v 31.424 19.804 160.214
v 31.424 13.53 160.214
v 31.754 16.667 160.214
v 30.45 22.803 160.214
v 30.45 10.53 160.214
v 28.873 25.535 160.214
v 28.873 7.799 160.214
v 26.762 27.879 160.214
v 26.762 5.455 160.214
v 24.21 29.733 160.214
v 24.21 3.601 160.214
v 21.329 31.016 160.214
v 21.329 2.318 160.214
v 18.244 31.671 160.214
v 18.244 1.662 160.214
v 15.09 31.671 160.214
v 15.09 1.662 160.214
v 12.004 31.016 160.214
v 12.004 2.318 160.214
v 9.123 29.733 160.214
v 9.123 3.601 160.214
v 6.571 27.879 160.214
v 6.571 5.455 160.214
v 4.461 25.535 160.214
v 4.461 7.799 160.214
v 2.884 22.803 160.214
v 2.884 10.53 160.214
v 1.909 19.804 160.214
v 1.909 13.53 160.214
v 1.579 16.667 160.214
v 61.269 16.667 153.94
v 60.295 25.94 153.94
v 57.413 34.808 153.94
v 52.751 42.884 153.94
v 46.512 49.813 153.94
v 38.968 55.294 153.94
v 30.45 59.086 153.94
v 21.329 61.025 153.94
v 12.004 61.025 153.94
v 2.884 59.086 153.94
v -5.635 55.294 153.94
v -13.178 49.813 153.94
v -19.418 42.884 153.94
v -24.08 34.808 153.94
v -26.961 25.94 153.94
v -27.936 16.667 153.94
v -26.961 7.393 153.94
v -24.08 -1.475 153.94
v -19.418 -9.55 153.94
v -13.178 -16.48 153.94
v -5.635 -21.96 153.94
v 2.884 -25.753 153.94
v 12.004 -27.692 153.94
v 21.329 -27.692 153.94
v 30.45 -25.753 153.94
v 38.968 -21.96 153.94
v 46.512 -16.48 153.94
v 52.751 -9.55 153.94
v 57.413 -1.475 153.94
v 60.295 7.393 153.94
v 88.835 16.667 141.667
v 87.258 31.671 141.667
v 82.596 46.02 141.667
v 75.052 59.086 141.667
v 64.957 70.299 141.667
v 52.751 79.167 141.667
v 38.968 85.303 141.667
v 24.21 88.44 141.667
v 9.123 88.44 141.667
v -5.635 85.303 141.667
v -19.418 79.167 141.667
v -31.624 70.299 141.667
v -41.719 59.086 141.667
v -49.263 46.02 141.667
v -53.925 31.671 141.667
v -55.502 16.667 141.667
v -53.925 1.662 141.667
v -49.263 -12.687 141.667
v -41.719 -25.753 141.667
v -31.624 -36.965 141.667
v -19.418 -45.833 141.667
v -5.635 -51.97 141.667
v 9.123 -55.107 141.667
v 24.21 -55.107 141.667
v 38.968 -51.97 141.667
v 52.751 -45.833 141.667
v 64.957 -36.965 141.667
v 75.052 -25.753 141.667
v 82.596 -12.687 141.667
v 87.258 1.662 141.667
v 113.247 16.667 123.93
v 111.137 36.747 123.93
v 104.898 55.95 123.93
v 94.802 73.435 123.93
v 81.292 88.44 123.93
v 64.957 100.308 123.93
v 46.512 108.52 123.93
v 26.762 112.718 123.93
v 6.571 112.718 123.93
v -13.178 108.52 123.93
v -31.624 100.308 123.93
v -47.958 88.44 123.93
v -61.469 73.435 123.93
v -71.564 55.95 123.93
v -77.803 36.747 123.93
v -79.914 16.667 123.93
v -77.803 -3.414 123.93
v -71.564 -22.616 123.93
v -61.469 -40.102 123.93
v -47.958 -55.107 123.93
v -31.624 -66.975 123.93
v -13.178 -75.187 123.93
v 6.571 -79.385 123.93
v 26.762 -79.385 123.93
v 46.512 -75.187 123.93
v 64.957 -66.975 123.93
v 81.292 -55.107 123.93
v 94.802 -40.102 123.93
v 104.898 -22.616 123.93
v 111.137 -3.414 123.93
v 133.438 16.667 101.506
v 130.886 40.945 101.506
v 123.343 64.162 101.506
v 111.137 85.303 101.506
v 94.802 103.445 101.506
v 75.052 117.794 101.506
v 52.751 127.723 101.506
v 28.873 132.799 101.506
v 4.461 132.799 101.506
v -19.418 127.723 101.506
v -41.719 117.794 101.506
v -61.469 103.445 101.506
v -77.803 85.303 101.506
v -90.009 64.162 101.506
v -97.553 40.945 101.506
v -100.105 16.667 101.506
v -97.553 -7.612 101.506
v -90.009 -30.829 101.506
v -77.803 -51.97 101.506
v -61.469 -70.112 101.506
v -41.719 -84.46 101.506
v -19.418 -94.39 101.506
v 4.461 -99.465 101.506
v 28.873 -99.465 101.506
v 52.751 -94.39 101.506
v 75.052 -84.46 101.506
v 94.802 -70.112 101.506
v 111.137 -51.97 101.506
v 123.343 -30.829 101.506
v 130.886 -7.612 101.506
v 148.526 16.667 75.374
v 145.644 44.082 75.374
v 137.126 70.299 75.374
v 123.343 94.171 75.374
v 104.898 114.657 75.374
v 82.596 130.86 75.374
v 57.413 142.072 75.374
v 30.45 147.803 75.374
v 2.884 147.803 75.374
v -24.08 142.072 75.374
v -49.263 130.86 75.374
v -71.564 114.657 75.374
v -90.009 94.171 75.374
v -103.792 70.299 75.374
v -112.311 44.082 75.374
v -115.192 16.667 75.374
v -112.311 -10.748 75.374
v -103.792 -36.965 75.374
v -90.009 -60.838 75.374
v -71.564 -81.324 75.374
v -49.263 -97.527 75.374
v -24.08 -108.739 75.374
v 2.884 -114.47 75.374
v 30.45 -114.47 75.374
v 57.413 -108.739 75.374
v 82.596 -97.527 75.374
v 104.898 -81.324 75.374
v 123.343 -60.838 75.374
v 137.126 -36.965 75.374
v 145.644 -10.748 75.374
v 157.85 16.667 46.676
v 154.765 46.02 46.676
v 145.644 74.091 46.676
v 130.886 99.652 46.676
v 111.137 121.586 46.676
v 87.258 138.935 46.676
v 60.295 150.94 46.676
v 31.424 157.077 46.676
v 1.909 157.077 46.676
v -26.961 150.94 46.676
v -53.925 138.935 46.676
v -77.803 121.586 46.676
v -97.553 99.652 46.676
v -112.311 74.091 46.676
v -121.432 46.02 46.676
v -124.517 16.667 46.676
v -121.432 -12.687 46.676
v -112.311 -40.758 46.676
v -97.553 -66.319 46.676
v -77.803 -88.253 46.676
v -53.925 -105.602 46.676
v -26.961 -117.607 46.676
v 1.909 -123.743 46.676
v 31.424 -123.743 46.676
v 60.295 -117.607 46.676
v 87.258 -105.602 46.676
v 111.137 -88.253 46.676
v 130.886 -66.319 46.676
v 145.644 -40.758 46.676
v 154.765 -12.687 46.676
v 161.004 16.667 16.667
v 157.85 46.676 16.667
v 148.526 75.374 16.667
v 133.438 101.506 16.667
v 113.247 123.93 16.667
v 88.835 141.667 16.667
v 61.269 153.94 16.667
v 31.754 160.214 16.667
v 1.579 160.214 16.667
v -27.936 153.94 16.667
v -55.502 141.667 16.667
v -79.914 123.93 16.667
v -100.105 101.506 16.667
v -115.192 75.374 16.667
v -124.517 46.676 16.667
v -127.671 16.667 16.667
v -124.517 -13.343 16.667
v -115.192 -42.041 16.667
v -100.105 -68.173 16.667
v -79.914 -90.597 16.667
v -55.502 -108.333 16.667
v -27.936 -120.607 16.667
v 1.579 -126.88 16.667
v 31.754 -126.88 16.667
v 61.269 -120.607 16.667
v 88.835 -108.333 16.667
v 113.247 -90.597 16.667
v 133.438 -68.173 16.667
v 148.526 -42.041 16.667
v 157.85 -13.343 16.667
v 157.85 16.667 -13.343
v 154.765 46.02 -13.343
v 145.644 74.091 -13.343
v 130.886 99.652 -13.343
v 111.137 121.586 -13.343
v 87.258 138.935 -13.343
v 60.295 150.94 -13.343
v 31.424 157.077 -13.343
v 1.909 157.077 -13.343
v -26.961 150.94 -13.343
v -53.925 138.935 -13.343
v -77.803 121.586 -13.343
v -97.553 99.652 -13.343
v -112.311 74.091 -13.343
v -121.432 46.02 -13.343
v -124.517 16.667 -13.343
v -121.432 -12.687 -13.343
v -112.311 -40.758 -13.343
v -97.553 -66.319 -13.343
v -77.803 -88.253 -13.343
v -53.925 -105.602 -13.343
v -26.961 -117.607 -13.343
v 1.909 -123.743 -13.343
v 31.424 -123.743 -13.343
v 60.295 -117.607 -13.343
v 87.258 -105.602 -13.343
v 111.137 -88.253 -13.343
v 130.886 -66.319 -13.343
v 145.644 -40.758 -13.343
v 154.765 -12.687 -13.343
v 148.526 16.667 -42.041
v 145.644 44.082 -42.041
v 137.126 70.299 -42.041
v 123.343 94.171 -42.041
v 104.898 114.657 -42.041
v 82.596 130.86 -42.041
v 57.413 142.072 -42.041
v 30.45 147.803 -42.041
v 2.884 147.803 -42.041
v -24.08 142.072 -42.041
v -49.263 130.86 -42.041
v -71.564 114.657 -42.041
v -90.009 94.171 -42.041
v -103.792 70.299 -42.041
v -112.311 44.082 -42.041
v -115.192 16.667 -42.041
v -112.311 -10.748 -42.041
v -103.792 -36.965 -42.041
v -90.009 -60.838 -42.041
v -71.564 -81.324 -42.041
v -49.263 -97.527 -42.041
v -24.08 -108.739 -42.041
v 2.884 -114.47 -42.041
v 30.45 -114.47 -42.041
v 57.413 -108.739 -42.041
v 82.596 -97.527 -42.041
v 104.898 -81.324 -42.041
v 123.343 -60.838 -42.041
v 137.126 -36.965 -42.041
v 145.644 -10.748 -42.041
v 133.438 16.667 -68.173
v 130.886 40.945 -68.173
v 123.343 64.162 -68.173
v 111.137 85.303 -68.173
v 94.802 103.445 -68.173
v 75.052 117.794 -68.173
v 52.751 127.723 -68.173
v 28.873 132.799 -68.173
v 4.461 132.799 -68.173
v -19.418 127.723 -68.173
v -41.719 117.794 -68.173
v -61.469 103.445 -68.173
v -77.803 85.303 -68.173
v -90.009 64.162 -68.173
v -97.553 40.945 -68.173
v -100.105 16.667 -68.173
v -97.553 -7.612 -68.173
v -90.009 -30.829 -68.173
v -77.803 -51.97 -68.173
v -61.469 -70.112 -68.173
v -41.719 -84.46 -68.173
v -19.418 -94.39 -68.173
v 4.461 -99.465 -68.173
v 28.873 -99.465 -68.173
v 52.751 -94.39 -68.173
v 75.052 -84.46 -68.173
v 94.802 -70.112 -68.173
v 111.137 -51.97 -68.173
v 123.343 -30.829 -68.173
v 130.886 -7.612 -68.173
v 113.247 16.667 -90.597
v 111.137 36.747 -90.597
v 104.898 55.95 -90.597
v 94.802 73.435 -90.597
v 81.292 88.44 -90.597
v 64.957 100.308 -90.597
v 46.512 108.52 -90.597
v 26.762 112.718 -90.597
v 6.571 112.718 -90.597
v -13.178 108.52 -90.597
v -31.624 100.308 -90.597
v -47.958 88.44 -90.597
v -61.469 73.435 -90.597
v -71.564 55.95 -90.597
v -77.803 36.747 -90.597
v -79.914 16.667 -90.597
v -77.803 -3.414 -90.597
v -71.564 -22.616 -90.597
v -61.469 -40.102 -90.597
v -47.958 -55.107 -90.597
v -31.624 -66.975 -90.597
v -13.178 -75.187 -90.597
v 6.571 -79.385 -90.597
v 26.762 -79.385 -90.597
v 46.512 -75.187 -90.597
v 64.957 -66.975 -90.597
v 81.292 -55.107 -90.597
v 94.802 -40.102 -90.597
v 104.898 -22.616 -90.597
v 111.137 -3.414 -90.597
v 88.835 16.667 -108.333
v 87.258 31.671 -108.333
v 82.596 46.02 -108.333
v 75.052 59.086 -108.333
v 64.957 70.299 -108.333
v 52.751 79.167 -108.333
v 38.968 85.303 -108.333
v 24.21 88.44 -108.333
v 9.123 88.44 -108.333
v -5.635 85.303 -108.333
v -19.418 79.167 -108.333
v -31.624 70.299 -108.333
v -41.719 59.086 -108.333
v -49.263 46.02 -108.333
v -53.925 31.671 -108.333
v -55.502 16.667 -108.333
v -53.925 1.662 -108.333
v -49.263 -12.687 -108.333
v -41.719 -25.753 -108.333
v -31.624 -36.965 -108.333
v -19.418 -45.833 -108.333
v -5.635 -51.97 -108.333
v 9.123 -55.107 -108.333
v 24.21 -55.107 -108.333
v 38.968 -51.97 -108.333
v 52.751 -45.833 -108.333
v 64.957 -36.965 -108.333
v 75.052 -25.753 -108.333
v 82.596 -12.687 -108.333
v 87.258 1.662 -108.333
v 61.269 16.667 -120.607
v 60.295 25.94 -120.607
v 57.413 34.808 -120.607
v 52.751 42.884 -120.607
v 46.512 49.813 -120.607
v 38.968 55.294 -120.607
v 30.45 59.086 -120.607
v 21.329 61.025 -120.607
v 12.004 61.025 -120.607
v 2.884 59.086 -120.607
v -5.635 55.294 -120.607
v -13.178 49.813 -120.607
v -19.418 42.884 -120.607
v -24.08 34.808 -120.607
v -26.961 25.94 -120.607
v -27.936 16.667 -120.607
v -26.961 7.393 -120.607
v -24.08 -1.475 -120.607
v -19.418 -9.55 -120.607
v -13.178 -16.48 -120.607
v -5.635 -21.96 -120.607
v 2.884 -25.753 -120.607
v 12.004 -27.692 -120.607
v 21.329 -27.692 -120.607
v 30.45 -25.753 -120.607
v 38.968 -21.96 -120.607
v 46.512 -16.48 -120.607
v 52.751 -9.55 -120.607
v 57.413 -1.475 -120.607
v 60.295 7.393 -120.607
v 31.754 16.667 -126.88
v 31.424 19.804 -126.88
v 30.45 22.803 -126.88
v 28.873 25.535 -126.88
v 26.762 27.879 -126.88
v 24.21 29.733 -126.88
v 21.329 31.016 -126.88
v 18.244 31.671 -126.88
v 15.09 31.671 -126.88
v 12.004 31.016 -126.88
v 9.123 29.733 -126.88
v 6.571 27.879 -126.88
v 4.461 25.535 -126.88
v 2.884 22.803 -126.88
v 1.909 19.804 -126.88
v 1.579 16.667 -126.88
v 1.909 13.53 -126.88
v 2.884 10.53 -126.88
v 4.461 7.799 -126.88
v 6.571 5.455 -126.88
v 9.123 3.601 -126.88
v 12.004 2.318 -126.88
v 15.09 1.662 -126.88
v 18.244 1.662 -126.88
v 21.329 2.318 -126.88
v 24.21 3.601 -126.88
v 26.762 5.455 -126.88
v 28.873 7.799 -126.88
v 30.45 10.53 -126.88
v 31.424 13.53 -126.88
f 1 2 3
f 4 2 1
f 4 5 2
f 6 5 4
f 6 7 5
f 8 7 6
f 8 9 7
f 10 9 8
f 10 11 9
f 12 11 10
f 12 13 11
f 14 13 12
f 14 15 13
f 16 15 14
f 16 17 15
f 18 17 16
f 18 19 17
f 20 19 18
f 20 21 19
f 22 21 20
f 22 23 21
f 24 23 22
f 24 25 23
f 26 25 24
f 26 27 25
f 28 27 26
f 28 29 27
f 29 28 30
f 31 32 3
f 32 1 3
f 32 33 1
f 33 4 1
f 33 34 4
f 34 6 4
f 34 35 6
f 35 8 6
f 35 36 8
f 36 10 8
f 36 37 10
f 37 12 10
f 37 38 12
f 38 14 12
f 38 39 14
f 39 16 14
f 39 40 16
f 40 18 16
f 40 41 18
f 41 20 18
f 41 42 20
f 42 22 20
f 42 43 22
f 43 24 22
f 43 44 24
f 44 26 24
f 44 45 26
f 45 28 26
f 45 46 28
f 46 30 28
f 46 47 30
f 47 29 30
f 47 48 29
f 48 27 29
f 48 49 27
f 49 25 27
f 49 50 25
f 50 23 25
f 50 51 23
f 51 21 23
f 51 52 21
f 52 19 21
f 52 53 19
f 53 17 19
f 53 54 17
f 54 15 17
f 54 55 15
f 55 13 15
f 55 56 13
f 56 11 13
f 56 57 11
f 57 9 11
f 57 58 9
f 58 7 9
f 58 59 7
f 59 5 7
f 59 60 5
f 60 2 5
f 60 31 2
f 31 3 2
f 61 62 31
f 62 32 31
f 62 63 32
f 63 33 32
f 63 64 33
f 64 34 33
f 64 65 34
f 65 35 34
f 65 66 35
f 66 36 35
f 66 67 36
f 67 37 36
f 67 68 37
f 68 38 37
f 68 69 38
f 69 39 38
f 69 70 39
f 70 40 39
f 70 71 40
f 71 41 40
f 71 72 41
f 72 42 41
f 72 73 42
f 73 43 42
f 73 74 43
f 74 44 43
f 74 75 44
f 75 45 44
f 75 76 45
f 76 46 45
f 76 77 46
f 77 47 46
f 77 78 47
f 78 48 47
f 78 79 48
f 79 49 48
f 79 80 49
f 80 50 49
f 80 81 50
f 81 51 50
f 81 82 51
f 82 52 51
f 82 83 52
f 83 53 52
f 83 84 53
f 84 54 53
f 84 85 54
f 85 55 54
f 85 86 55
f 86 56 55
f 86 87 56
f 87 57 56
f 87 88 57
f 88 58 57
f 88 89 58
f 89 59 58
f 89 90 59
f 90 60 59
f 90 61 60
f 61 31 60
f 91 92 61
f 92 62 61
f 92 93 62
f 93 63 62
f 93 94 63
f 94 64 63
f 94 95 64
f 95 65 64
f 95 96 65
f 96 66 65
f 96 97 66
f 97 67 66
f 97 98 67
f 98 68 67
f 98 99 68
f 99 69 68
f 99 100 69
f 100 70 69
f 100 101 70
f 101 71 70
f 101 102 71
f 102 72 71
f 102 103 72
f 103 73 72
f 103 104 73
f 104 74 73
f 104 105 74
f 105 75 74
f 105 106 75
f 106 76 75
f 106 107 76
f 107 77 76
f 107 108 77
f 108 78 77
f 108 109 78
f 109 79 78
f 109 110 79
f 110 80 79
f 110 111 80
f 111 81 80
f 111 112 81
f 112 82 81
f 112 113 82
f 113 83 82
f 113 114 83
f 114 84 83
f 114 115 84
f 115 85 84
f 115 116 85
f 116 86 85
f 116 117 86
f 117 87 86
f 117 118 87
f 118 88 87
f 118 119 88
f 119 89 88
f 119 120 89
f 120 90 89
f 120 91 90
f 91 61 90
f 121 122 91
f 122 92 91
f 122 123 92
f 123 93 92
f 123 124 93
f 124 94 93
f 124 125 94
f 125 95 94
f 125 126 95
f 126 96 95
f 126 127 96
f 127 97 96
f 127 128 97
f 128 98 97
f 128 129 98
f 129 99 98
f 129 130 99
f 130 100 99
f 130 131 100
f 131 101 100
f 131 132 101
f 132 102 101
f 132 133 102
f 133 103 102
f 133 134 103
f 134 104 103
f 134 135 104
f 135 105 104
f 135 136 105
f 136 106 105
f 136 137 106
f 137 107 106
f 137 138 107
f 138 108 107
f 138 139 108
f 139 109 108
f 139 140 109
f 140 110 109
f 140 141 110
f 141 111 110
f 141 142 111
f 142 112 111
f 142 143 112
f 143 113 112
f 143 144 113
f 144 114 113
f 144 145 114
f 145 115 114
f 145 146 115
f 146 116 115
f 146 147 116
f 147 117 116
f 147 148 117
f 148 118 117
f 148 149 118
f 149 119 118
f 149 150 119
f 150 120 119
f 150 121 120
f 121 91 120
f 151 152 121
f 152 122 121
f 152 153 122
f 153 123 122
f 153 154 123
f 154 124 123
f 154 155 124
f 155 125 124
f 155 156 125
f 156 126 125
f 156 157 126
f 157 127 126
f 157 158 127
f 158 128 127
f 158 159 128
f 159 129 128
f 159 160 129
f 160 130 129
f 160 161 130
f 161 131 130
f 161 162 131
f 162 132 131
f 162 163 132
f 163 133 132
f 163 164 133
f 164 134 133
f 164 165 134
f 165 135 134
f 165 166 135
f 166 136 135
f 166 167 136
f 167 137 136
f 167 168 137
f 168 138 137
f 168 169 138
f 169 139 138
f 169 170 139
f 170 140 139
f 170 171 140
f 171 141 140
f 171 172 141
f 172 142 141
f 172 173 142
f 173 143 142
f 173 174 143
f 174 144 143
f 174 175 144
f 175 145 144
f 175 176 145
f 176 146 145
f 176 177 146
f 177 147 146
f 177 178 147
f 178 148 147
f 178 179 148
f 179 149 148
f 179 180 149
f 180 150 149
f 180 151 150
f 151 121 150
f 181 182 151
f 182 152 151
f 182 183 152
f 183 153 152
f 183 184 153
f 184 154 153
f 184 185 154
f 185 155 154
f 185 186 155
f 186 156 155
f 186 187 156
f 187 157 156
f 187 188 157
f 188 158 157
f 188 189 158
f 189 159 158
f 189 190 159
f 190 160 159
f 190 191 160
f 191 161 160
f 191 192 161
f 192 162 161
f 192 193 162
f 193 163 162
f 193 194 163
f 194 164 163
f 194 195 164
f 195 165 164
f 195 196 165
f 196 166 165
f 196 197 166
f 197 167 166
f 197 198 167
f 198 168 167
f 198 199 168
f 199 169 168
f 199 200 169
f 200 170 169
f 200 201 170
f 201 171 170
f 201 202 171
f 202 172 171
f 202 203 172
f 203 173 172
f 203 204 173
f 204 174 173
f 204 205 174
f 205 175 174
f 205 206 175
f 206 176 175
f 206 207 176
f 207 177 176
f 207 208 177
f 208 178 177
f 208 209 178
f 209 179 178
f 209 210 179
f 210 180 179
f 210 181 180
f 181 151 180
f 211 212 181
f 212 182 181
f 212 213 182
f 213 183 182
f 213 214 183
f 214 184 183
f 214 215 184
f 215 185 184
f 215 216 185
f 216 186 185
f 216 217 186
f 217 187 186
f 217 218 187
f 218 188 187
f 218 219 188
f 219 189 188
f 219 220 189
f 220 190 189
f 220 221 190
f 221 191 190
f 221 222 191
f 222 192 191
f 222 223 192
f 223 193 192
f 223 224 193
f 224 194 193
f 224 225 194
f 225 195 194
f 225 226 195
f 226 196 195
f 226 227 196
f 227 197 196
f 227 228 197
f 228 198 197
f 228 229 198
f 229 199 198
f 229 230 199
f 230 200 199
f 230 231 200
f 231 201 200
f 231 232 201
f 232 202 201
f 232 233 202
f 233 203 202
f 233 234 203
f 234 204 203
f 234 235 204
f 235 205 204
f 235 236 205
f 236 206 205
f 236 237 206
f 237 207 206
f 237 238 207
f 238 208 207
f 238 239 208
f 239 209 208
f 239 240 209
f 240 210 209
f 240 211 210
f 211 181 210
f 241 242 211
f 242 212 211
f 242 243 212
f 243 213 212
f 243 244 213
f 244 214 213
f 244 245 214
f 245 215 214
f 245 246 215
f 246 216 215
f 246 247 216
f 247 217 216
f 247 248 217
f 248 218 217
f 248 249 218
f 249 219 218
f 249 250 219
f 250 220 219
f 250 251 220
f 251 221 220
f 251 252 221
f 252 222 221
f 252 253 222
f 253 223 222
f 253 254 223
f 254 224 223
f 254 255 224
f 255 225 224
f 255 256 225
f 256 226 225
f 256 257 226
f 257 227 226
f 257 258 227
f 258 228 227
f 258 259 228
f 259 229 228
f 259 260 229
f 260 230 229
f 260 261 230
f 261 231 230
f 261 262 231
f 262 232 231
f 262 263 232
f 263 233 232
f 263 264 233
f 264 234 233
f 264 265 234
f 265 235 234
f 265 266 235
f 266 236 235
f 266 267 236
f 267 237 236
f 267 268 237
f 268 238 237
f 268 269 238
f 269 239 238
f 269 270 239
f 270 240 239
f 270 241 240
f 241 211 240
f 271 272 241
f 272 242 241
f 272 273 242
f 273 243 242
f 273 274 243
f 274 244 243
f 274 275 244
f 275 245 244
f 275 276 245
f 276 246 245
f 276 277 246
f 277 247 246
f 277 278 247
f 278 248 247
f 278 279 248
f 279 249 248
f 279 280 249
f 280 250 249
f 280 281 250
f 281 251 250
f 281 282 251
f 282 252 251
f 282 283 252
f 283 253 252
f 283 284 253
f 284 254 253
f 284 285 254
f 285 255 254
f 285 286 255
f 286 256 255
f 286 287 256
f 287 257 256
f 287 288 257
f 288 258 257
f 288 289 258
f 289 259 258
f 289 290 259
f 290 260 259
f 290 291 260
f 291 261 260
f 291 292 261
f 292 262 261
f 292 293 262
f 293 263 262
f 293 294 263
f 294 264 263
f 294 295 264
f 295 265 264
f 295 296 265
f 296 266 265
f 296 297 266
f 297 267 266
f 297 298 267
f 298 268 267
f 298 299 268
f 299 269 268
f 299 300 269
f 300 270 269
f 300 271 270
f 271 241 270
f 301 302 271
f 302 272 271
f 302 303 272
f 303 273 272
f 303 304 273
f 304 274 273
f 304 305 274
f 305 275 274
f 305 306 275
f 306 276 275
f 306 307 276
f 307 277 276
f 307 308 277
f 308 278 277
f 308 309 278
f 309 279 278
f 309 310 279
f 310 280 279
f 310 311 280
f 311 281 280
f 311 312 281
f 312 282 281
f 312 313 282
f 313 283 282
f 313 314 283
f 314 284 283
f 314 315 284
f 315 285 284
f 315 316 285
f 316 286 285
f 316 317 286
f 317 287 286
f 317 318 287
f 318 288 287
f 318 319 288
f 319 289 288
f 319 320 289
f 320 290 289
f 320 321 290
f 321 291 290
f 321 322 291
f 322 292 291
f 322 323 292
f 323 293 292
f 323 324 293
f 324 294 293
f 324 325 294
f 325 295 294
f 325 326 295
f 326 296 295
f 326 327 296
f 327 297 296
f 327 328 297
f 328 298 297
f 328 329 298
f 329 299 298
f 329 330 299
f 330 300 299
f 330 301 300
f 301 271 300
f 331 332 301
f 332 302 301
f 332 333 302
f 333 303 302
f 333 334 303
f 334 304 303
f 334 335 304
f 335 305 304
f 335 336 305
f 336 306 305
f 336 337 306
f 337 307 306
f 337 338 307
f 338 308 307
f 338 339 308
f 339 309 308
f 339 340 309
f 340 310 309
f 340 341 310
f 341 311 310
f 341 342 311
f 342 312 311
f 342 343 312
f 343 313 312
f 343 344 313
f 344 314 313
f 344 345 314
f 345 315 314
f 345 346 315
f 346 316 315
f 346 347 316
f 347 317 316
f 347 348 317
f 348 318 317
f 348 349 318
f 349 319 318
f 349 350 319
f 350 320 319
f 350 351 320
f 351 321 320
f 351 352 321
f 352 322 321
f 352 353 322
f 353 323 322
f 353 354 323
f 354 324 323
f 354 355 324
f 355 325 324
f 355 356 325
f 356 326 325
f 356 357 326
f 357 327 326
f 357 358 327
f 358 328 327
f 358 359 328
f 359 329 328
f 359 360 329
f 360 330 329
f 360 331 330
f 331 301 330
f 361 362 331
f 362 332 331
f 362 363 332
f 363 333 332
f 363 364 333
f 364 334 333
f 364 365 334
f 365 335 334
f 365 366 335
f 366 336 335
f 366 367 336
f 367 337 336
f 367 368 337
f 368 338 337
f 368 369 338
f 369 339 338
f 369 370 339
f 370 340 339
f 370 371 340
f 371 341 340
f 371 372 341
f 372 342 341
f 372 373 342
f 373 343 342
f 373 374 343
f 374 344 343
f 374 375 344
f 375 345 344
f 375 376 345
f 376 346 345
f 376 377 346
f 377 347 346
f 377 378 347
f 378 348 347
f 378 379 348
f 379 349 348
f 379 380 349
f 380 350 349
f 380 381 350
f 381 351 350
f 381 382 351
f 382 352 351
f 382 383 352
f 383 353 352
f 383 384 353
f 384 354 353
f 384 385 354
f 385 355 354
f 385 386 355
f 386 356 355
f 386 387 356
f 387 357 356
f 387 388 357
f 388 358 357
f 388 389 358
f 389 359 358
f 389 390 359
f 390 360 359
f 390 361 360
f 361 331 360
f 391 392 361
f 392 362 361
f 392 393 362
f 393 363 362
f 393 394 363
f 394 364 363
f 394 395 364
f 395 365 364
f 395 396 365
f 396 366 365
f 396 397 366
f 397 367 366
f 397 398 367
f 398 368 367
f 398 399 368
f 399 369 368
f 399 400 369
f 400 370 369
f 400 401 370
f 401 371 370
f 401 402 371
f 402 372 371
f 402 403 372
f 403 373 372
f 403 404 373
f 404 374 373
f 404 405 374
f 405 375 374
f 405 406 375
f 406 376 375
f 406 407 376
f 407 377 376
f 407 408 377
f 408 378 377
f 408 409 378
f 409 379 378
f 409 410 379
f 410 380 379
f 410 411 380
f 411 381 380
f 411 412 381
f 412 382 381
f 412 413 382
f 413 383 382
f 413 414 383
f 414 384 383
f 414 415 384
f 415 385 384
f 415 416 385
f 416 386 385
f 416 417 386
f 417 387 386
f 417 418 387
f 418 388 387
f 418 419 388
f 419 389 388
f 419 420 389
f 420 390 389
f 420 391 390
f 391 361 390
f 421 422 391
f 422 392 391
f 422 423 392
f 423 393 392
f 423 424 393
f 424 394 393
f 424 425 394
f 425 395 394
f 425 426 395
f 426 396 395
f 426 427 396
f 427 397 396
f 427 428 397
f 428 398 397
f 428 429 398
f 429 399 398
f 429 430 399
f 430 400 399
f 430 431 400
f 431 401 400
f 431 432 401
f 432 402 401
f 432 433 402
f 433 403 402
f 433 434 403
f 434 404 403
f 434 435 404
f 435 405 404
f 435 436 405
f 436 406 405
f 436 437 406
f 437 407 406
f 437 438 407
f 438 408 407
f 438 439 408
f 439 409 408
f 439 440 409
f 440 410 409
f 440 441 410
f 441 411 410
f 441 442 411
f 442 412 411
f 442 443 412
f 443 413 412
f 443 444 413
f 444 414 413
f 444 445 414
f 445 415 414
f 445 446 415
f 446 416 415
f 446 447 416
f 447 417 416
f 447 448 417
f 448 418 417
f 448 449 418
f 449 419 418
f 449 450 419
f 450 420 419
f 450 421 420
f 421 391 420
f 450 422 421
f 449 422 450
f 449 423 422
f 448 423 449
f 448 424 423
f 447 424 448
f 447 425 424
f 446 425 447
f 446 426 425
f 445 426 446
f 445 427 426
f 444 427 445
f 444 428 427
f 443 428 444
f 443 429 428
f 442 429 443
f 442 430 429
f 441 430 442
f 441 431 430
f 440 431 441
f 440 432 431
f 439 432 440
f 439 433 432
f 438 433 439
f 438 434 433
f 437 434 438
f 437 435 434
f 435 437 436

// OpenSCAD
xA = 100;
yA = 100;
zA = 100;

xB= 50;
yB= 50;
zB= 50;

xC= -100;
yC= -100;
zC= -100;

xa= xA-(floor(xA));
ya= yA-(floor(yA));
za= zA-(floor(zA));
xb= xB-(floor(xB));
yb= yB-(floor(yB));
zb= zB-(floor(zB));
xc= xC-(floor(xC));
yc= yC-(floor(yC));
zc= zC-(floor(zC));

if(xa||ya||za||xb||yb||zb||xc||yc||zc!=0){  
echo("Bad input");
}
else{
//A([xA,yA,zA])
//B([xB,yB,zB])
//C([xC,yC,zC])

xT = ((xA+xB+xC)/3);
yT = ((yA+yB+yC)/3);
zT = ((zA+zB+zC)/3);

//T([xT,yT,zT])

xV = (xT-xA);
yV = (yT-yA);
zV = (zT-zA);

//V([xV,yV,zV])

x = sqrt(xV^2+yV^2+zV^2);
translate([xT,yT,zT])
sphere(r = x);

echo("The centre of the circle S is",xT,yT,zT);
echo("The radius is",x, "cm");
}
